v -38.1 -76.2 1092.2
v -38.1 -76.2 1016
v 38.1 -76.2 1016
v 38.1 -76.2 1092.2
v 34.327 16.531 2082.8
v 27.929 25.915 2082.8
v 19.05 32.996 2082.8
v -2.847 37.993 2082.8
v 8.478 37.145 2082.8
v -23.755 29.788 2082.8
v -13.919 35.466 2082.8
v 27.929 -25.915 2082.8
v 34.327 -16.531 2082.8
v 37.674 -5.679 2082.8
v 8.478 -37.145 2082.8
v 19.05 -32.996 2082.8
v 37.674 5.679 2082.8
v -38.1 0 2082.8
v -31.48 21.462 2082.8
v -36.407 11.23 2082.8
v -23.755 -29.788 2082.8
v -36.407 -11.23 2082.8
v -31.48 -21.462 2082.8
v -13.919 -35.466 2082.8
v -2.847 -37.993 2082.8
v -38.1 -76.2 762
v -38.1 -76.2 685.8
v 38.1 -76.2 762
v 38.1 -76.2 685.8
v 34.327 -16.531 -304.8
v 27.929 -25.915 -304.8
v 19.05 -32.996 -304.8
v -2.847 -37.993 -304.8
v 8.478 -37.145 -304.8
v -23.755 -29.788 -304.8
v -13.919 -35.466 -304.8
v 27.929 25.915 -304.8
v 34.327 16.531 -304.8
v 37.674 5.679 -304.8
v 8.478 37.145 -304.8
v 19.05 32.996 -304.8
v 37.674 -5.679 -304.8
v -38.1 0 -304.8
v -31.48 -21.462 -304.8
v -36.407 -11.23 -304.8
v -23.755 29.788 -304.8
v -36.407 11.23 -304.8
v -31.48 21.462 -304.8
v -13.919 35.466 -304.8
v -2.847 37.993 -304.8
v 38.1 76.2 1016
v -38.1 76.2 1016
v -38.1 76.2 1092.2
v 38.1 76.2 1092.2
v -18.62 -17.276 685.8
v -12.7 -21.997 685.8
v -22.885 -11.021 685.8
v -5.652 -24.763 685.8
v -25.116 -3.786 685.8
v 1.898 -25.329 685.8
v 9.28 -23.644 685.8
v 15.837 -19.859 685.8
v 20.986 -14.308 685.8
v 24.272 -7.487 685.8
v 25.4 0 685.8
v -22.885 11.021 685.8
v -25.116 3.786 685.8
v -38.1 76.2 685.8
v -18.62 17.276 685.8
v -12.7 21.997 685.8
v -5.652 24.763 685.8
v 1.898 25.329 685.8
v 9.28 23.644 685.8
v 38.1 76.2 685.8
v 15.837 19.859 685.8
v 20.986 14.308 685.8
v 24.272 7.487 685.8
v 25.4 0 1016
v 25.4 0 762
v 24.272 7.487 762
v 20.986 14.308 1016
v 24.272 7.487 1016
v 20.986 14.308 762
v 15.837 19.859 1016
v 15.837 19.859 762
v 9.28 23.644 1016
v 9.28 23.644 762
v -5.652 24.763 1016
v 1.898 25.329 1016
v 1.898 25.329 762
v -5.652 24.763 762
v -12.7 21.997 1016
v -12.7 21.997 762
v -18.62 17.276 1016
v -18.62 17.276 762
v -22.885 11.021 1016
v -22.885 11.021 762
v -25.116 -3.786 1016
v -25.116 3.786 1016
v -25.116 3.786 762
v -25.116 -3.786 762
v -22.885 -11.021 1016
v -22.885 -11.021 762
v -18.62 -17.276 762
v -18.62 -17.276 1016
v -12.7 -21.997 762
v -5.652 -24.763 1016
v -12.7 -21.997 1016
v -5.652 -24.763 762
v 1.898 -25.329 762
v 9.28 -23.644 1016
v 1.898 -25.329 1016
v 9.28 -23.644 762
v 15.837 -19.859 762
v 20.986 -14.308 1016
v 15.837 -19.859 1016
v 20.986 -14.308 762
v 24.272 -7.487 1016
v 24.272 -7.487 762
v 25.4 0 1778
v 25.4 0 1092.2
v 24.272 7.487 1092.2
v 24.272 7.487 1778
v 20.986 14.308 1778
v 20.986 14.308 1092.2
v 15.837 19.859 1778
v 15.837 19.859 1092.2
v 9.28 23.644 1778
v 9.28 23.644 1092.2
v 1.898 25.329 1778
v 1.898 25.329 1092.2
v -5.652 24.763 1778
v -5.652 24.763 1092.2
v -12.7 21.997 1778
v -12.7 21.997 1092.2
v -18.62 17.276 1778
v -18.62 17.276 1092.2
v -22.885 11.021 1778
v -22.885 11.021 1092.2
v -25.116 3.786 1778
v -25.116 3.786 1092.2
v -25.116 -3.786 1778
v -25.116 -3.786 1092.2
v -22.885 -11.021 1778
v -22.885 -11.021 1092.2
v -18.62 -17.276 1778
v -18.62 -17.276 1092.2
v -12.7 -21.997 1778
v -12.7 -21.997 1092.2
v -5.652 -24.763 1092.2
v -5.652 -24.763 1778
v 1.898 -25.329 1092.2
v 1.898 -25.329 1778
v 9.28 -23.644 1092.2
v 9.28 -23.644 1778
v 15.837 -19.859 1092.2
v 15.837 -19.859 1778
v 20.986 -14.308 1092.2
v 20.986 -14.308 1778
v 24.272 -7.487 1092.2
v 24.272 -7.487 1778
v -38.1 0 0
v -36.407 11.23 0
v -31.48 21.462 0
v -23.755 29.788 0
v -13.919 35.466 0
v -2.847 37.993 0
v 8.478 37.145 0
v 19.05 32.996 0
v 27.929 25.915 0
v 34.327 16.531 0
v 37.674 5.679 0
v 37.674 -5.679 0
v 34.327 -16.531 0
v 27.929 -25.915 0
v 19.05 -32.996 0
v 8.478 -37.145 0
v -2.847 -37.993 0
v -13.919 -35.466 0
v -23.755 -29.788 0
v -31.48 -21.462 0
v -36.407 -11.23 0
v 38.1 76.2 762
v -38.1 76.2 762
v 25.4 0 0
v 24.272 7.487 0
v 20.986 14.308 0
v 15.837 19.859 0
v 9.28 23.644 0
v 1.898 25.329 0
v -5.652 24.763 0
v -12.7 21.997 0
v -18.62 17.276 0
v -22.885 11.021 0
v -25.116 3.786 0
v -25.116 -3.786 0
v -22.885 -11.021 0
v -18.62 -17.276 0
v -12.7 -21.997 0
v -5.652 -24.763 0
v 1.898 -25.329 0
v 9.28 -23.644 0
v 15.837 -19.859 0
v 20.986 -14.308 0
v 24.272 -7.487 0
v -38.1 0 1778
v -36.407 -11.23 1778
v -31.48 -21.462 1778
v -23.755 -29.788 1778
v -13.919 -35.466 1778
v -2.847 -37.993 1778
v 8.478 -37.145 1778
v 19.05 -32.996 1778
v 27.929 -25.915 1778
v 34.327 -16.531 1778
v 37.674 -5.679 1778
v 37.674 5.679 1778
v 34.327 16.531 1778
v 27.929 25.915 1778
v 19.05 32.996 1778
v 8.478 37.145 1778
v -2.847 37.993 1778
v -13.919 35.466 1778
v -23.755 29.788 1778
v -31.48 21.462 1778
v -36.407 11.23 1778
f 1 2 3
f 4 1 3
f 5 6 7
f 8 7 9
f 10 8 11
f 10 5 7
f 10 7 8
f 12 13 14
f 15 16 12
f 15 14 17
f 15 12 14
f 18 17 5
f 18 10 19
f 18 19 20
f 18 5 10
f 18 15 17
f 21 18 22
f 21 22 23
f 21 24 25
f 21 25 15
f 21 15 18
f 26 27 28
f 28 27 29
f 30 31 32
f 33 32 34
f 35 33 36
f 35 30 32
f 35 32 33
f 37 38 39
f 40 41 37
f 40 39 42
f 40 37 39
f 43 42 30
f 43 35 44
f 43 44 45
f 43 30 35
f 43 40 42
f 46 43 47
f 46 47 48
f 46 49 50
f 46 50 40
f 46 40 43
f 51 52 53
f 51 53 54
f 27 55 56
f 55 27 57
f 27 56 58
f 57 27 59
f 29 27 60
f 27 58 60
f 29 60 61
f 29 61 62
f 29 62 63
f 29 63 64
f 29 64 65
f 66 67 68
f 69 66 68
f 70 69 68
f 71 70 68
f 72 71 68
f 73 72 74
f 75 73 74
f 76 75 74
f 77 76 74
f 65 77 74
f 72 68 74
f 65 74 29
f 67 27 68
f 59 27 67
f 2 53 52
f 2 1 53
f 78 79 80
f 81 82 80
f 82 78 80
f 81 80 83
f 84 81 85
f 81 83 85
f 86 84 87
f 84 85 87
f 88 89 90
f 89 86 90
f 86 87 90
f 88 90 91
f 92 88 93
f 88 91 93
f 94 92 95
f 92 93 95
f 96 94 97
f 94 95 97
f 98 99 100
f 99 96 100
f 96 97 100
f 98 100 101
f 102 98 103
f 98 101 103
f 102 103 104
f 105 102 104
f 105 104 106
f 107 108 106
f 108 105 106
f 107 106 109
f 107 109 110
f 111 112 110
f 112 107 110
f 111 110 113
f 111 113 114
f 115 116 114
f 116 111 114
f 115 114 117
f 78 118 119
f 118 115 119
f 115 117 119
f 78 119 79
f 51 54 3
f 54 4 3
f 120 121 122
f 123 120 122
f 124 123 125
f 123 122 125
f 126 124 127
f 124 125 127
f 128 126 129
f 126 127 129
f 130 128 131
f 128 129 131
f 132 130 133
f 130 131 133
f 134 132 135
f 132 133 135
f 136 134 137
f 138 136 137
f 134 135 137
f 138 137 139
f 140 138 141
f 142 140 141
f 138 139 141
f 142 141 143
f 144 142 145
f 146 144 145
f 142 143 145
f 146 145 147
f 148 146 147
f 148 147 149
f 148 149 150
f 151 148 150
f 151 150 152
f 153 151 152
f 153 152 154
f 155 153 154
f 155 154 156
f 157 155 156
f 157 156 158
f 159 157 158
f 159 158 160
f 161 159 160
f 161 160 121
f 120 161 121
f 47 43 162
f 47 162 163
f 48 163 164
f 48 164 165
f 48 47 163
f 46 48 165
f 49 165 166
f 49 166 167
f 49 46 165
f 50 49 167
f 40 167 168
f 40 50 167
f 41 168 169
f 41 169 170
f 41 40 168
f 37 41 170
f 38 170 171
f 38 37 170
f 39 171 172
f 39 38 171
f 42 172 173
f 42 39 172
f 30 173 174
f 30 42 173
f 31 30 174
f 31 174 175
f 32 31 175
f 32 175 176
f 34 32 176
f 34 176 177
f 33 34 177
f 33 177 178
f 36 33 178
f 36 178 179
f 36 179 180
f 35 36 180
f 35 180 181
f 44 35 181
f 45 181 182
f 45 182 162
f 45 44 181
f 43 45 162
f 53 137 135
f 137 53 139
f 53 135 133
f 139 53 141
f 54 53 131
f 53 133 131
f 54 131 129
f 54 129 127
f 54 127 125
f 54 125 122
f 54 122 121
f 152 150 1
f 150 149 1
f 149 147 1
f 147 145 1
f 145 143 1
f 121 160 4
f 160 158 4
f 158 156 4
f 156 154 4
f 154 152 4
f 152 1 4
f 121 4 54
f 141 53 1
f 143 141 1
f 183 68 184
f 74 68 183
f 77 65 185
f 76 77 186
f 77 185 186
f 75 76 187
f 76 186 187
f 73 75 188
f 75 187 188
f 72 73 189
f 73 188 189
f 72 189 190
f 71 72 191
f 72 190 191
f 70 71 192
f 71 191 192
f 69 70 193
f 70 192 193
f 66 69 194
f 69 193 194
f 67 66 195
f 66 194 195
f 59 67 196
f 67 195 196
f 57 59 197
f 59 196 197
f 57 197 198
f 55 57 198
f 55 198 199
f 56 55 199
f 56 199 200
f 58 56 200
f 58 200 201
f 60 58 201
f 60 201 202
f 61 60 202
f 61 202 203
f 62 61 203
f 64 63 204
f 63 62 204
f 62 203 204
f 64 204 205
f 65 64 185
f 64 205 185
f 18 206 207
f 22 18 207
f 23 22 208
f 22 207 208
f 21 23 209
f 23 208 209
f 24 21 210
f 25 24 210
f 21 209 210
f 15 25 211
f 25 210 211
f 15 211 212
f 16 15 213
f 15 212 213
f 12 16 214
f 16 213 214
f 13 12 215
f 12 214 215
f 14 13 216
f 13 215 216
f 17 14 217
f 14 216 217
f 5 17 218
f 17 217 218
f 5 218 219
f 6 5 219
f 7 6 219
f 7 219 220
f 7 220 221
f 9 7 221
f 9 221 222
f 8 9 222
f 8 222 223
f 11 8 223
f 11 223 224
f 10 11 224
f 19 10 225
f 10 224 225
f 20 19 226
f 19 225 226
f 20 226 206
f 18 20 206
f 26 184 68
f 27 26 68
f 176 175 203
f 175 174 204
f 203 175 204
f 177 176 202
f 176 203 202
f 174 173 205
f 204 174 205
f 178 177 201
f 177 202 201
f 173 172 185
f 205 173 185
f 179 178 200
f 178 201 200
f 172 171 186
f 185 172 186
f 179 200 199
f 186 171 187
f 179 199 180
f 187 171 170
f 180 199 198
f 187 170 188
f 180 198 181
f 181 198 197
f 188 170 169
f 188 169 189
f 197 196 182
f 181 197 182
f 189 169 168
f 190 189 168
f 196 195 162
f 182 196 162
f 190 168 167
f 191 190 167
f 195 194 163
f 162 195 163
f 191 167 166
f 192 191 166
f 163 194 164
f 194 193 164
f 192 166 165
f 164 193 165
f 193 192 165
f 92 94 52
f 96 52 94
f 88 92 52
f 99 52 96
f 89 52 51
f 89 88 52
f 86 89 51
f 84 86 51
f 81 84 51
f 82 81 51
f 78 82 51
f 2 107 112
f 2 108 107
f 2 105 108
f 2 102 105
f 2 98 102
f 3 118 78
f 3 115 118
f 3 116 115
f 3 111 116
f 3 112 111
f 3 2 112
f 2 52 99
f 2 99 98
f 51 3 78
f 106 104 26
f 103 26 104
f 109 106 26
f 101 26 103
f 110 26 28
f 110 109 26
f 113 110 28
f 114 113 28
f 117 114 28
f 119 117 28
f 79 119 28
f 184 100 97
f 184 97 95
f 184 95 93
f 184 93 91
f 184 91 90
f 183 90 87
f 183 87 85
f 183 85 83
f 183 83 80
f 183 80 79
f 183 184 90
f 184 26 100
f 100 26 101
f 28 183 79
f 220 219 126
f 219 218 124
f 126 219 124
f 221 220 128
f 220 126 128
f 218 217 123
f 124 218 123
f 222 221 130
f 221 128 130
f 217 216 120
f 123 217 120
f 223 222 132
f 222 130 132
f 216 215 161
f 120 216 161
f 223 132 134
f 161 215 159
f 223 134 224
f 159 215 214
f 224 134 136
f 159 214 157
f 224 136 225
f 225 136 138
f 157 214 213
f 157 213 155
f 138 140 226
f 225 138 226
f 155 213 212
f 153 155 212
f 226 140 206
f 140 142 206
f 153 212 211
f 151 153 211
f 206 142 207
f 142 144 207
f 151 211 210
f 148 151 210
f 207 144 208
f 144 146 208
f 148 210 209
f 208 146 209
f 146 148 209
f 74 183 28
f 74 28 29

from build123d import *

# Parameters (mm, degrees)
SKETCH1_R           = 25.4
BOSS_EXTRUDE1_DEPTH = 1778
SKETCH2_R           = 38.1
BOSS_EXTRUDE2_DEPTH = 304.8
BOSS_EXTRUDE3_START = 304.8
SKETCH3_R           = 38.1
BOSS_EXTRUDE3_DEPTH = 304.8
SKETCH4_W           = 76.2
SKETCH4_H           = 76.2
BOSS_EXTRUDE4_DEPTH = 76.2


with BuildPart() as part:
    # Sketch1 → Boss-Extrude1 (new body)
    with BuildSketch(Plane.XY):
        Circle(SKETCH1_R)
    extrude(amount=BOSS_EXTRUDE1_DEPTH)

    # Sketch2 → Boss-Extrude2 (add)
    with BuildSketch(Plane.XY.offset(1778)):
        with Locations(Location((0, 0, 0), (0, 0, 180))):
            Circle(SKETCH2_R)
    extrude(amount=BOSS_EXTRUDE2_DEPTH)

    # Sketch3 → Boss-Extrude3 (add)
    with BuildSketch(Plane(origin=(0, 0, 0), x_dir=(-1, 0, 0), z_dir=(0, 0, -1)).offset(BOSS_EXTRUDE3_START)):
        Circle(SKETCH3_R)
    extrude(amount=-BOSS_EXTRUDE3_DEPTH)

    # Sketch4 → Boss-Extrude4 (add, symmetric)
    with BuildSketch(Plane(origin=(0, 0, 0), x_dir=(1, 0, 0), z_dir=(0, 1, 0))):
        with Locations((0, -1054.1)):
            Rectangle(SKETCH4_W, SKETCH4_H)
        with Locations((0, -723.9)):
            Rectangle(SKETCH4_W, SKETCH4_H)
    extrude(amount=BOSS_EXTRUDE4_DEPTH, both=True)


solid = part.part
